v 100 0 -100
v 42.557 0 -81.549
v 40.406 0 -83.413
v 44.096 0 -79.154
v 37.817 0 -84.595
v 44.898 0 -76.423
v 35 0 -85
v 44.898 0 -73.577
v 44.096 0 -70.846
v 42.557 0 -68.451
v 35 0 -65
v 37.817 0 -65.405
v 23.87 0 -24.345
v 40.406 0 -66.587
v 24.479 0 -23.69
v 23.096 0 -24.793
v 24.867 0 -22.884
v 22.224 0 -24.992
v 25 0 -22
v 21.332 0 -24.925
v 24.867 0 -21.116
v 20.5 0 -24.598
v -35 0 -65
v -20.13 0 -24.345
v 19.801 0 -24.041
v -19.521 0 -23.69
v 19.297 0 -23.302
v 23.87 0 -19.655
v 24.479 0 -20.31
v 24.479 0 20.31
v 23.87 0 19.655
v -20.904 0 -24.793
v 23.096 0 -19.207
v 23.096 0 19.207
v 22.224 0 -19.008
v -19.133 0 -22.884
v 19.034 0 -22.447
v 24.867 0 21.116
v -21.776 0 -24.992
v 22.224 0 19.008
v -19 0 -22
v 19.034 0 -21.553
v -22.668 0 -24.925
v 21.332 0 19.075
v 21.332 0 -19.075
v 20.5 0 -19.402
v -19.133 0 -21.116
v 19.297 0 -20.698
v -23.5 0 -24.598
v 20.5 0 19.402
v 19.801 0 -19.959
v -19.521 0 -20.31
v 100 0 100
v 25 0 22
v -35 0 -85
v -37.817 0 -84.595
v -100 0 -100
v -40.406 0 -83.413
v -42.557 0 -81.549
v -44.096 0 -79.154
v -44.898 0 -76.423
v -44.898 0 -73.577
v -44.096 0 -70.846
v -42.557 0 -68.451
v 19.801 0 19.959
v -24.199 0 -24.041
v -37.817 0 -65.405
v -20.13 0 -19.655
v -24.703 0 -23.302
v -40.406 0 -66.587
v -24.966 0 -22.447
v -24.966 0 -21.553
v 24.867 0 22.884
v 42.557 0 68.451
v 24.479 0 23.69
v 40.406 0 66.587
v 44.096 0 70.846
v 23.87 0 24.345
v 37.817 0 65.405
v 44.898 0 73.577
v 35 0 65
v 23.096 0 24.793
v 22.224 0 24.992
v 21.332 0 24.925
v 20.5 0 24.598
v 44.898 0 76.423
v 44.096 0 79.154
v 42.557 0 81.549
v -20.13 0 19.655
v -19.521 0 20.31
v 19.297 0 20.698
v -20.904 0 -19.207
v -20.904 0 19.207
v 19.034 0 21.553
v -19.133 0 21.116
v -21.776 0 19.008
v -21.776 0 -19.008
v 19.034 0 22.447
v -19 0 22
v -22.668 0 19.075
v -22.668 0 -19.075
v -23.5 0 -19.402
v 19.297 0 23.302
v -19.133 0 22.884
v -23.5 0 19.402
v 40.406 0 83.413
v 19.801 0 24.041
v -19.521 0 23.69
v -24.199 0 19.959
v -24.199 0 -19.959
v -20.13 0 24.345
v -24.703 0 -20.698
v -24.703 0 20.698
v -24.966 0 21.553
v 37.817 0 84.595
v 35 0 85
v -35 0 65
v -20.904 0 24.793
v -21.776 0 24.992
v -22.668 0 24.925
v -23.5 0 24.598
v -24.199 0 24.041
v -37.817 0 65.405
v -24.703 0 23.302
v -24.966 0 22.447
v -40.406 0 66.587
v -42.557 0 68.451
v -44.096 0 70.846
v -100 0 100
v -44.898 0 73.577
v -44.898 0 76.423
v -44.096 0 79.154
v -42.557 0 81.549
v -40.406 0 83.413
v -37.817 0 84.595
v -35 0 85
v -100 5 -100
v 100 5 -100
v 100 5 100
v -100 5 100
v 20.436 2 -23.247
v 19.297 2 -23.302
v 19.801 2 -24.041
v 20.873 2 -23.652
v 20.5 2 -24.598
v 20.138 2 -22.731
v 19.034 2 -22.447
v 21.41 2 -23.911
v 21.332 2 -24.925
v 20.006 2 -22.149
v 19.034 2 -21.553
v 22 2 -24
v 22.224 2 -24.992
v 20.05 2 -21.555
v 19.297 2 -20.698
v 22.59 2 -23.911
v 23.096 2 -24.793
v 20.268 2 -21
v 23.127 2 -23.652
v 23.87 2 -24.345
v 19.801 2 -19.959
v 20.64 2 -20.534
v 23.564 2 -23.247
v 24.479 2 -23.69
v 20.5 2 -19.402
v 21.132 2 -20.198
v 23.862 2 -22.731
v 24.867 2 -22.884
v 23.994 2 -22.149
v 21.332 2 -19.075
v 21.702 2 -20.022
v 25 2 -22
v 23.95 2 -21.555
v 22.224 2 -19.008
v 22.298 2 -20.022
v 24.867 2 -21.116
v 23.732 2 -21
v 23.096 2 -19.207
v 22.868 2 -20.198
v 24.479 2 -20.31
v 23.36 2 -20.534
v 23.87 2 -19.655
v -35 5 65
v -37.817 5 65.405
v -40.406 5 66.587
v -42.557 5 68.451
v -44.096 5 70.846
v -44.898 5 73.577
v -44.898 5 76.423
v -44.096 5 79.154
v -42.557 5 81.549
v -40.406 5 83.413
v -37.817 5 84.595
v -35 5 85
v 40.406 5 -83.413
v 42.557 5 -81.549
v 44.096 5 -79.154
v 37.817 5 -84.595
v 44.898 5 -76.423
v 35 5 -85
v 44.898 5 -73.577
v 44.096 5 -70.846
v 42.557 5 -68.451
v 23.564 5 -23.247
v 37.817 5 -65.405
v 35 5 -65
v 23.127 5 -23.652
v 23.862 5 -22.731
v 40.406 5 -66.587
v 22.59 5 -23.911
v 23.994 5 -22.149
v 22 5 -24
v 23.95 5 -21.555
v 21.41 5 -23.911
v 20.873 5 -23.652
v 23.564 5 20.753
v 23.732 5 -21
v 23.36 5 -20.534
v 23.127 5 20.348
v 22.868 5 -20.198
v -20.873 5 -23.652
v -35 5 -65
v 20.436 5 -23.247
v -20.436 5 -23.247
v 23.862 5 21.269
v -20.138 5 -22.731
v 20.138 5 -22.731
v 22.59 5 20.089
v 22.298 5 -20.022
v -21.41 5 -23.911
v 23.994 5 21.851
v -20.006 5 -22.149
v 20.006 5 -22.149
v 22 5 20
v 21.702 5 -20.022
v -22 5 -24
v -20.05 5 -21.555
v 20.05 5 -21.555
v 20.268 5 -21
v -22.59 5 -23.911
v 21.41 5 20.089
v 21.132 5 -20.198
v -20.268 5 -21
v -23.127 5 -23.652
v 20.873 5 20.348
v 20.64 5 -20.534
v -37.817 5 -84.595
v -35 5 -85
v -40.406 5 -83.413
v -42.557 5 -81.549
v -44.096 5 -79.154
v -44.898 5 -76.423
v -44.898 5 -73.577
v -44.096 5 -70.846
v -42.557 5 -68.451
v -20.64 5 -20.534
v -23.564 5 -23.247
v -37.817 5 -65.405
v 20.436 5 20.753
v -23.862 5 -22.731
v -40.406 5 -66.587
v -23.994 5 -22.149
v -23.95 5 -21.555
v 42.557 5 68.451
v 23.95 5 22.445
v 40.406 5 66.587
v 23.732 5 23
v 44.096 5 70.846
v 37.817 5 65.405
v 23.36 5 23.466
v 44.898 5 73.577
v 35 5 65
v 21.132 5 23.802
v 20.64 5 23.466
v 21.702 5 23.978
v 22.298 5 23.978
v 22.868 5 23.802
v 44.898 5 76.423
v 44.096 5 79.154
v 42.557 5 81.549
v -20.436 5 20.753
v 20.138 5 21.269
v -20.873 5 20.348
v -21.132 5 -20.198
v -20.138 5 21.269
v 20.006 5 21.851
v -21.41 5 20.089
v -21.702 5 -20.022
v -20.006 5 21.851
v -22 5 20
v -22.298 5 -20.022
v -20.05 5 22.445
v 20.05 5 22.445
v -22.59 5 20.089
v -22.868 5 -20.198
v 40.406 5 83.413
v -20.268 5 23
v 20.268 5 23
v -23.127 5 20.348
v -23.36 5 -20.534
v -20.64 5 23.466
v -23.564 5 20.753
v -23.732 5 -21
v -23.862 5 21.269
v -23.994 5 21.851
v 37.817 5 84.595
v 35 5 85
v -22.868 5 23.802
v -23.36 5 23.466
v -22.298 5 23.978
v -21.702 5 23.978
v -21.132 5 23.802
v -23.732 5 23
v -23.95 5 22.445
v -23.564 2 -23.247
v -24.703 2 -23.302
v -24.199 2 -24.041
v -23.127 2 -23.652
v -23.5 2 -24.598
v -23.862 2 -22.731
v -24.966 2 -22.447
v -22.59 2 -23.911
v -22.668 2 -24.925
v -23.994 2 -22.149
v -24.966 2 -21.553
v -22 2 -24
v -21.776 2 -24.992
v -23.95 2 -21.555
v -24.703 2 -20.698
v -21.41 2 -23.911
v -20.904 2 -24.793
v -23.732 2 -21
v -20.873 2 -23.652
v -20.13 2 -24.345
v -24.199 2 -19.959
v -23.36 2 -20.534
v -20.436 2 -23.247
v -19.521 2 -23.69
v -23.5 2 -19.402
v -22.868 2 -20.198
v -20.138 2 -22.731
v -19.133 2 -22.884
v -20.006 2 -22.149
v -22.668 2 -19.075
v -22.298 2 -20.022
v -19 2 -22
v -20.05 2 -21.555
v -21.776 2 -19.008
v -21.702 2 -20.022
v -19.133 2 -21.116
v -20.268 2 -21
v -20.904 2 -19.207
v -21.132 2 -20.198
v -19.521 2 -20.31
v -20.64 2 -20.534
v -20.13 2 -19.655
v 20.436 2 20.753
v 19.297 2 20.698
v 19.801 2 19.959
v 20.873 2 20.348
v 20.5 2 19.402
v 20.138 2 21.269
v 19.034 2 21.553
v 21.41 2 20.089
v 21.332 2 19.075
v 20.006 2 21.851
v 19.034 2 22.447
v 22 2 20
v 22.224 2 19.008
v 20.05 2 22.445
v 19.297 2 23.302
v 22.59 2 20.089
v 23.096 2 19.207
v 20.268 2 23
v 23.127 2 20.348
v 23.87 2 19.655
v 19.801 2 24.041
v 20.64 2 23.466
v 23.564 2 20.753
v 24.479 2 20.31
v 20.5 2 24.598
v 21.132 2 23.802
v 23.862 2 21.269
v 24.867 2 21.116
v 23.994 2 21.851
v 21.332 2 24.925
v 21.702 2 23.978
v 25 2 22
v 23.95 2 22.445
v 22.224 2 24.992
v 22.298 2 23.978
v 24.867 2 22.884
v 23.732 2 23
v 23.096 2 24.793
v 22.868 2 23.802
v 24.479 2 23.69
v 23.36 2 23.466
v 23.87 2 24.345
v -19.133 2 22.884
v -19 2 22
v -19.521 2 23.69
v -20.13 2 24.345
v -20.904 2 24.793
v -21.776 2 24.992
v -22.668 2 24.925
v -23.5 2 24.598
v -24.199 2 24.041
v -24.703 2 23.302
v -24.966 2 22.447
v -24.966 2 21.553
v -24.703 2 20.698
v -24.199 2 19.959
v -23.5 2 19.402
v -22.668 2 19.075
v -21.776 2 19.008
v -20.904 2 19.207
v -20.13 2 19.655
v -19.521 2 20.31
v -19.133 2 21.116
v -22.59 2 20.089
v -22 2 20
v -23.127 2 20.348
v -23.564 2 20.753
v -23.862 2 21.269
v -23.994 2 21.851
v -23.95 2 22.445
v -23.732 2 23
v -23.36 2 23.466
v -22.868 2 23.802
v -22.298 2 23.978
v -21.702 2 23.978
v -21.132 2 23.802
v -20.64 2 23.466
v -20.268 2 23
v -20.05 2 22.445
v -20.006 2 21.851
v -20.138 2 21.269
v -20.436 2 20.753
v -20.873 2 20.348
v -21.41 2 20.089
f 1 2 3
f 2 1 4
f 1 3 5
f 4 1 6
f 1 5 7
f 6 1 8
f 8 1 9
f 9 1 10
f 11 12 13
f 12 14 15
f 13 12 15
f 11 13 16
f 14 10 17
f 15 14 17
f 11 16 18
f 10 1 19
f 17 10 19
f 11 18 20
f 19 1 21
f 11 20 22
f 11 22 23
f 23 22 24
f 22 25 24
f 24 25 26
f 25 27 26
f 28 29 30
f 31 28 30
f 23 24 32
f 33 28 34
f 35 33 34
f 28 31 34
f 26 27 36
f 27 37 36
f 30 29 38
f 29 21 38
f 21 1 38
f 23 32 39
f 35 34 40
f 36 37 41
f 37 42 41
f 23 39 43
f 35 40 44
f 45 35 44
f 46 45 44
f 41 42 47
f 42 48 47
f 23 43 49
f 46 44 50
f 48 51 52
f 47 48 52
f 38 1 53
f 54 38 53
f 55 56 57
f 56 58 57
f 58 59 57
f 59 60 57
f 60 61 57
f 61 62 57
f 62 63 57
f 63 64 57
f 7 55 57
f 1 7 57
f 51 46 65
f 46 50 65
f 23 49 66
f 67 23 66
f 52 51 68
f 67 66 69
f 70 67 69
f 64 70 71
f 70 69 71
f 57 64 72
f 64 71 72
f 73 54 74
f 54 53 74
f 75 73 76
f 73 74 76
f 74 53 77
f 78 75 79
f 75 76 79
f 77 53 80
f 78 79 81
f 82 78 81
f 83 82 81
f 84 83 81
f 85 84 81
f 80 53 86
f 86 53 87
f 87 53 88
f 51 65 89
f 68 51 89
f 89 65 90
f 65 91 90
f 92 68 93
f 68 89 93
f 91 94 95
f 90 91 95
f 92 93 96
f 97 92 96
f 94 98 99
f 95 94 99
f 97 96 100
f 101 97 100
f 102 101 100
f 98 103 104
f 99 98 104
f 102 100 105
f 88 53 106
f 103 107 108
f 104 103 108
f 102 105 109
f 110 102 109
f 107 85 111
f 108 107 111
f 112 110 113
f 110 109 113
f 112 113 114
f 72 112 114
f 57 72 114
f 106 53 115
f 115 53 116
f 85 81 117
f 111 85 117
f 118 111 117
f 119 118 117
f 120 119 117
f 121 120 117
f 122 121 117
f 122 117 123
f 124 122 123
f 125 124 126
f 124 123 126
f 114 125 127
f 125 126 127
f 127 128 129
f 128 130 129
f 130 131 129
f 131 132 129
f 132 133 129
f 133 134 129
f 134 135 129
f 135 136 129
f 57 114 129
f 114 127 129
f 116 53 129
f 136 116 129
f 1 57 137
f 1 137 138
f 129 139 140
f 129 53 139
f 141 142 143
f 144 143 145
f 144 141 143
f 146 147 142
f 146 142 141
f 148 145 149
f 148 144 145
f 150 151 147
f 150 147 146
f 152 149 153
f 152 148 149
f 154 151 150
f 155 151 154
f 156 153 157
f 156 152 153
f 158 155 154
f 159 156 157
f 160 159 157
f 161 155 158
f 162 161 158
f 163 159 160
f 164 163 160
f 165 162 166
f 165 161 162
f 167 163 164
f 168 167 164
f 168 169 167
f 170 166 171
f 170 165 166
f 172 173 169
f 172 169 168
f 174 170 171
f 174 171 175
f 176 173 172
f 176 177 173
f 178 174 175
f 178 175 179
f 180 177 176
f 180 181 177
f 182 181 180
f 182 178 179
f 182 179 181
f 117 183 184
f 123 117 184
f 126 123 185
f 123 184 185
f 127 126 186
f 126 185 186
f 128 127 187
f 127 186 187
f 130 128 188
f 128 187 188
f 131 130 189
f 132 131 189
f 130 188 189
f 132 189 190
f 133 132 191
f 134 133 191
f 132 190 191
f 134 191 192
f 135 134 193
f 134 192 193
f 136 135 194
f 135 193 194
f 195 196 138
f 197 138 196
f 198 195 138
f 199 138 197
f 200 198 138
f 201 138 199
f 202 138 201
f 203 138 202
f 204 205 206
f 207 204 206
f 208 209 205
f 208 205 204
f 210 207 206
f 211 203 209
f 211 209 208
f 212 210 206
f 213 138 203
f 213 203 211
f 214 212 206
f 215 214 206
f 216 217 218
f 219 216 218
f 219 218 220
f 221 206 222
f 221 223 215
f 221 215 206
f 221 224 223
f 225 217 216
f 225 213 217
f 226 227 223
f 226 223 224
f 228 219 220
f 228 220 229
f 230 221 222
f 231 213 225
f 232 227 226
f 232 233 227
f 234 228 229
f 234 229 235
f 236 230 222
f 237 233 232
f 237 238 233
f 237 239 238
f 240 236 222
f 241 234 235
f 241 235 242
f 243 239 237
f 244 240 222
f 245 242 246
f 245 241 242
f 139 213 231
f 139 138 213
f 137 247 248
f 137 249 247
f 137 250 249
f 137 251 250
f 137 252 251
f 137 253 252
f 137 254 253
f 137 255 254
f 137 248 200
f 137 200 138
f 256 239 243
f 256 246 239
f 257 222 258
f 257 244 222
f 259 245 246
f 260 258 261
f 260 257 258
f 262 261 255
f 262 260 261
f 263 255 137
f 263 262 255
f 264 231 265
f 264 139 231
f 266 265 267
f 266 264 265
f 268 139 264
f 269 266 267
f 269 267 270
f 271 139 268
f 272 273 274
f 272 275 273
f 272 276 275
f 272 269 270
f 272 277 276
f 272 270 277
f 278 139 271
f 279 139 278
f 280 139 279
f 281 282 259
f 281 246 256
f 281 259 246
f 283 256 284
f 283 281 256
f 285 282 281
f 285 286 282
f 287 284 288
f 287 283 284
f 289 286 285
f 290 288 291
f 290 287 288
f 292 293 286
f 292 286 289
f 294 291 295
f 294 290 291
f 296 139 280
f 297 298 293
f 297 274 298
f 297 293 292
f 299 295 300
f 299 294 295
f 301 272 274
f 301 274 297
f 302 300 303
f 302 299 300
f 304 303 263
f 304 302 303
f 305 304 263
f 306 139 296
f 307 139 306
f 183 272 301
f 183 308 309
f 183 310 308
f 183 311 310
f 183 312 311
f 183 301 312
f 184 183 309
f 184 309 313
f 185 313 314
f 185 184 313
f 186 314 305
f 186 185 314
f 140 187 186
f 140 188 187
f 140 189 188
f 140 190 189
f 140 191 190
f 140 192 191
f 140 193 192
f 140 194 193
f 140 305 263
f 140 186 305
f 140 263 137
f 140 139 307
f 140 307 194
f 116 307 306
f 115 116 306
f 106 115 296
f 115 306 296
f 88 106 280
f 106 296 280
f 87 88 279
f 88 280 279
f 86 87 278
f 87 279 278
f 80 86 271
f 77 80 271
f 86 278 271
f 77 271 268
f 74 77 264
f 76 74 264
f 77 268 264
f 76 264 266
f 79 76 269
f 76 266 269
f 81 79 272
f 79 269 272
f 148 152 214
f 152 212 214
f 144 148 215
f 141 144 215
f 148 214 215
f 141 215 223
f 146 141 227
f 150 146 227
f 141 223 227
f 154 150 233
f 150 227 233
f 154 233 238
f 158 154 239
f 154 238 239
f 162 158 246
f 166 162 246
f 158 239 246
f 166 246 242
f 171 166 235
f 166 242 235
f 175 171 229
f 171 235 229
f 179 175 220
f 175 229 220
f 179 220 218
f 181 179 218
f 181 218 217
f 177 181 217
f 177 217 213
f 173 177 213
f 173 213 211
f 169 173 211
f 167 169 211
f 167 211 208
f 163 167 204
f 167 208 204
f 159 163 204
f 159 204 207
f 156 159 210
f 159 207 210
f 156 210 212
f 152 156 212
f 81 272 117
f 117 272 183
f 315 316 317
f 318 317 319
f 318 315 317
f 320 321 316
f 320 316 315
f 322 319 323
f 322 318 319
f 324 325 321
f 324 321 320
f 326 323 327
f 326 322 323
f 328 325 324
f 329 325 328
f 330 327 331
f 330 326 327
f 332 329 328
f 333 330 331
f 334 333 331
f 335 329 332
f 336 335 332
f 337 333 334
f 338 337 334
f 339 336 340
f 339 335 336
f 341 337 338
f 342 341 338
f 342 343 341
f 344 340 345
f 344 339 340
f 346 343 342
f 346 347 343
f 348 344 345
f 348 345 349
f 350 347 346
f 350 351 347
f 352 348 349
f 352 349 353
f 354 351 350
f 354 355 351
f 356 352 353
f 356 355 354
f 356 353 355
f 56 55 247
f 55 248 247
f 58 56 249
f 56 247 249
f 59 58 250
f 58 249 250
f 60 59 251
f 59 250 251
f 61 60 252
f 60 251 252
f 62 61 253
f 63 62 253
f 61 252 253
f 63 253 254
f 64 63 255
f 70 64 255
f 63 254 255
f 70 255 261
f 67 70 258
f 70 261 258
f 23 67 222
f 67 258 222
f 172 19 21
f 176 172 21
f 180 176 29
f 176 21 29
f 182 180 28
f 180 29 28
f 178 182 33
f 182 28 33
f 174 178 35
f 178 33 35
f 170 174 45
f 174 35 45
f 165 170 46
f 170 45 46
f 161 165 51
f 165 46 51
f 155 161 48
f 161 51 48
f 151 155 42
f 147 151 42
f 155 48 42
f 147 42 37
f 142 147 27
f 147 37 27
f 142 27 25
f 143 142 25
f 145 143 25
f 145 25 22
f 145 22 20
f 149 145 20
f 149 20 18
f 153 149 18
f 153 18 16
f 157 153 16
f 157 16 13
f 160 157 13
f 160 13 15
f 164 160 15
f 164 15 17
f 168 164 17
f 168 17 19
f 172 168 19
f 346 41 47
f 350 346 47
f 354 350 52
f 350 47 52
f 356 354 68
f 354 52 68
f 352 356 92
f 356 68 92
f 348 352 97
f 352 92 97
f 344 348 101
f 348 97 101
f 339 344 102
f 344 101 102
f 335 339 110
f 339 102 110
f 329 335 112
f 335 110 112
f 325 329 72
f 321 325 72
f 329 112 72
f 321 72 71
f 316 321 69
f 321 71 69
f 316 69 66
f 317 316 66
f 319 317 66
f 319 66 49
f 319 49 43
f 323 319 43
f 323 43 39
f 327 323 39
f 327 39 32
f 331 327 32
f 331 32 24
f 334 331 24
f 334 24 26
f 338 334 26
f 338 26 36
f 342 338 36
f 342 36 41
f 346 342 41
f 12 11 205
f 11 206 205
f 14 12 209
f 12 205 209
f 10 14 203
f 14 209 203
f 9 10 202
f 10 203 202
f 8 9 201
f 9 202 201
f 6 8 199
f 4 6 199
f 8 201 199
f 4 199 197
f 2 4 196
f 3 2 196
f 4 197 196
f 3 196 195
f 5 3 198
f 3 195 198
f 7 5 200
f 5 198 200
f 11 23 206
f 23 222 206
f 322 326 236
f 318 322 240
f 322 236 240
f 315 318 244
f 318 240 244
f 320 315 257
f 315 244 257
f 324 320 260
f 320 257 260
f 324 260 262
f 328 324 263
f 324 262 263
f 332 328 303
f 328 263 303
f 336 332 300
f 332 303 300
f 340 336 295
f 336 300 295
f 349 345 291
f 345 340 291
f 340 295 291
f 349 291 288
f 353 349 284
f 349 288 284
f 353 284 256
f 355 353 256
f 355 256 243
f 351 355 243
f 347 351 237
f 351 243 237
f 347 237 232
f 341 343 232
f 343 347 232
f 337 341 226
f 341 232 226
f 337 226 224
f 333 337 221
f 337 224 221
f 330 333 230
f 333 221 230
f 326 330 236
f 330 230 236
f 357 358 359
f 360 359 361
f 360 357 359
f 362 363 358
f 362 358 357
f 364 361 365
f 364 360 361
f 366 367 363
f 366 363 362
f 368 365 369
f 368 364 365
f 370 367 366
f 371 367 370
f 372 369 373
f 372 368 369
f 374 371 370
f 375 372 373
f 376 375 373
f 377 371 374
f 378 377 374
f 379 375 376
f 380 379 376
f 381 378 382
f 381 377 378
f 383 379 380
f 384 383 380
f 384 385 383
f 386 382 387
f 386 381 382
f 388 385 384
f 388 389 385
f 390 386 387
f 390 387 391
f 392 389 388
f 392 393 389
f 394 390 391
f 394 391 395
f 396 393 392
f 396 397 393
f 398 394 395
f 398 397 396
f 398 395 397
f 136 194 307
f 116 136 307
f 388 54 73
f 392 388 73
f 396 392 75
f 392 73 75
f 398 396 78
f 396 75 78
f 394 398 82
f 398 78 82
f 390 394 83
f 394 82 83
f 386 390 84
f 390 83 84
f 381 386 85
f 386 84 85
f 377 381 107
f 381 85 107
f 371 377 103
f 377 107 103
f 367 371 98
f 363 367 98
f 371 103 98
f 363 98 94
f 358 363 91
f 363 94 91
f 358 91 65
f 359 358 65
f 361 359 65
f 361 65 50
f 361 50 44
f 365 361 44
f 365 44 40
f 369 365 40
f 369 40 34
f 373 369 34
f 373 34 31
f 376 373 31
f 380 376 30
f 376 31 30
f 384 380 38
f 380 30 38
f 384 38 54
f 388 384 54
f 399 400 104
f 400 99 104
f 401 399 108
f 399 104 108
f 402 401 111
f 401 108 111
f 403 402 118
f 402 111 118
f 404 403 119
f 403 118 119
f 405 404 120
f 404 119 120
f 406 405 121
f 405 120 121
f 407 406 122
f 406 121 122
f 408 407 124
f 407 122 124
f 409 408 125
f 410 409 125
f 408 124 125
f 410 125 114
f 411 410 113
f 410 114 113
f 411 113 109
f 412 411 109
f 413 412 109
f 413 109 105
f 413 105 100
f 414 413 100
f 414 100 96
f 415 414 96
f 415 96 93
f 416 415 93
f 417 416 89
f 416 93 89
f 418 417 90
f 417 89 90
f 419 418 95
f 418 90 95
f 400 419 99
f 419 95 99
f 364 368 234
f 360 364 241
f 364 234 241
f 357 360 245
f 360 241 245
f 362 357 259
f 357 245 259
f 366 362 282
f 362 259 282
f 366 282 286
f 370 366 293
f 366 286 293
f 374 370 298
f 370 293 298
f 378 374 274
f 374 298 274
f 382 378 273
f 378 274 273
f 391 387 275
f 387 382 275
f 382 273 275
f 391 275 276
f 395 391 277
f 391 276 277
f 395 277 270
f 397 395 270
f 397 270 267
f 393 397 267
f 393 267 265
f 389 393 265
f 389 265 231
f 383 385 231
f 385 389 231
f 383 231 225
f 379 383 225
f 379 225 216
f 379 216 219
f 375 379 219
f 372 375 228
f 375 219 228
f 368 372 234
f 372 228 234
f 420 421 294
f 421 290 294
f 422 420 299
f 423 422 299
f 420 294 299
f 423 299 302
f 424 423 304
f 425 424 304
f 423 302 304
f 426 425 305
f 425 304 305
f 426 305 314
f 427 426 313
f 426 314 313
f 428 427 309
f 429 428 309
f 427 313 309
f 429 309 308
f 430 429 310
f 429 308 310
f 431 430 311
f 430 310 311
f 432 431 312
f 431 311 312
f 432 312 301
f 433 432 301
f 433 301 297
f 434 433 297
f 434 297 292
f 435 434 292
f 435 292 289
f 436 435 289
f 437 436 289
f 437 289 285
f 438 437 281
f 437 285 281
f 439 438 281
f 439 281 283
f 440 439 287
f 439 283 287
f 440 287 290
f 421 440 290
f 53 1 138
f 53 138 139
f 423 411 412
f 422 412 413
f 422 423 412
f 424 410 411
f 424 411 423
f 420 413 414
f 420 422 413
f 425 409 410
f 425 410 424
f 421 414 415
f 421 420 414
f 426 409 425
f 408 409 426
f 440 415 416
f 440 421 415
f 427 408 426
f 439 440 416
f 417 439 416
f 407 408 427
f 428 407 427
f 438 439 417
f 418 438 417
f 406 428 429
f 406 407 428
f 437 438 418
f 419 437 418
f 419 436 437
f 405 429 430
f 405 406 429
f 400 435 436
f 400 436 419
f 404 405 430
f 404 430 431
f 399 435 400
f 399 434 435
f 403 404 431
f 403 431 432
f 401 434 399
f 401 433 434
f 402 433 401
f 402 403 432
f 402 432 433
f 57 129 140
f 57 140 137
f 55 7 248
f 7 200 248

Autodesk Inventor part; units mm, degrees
ref_plane "YZ Plane" through (0, 0, 0) normal (1, 0, 0) x (0, 1, 0)
ref_plane "XZ Plane" through (0, 0, 0) normal (0, 1, 0) x (-1, 0, 0)
ref_plane "XY Plane" through (0, 0, 0) normal (0, 0, 1) x (1, 0, 0)
sketch "Sketch1" plane through (0, 0, 0) normal (0, 1, 0) x (-1, 0, 0)
  line L0 (-100, 100) -> (100, 100)
  line L1 (100, 100) -> (100, -100)
  line L2 (100, -100) -> (-100, -100)
  line L3 (-100, -100) -> (-100, 100)
  line L4 (-100, 100) -> (100, -100) construction
  line L5 (100, 100) -> (-100, -100) construction
  point P0 (0, 0)
  dimension "d0" = 200
  dimension "d1" = 200
extrude "Extrusion1" add sketch "Sketch1" along normal blind 5
sketch "Sketch6" plane through (0, 0, 0) normal (0, -1, 0) x (1, 0, 0)
  line L0 (-22, 22) -> (22, 22)
  line L1 (22, 22) -> (22, -22)
  line L2 (22, -22) -> (-22, -22)
  line L3 (-22, -22) -> (-22, 22)
  line L4 (-22, 22) -> (22, -22) construction
  line L5 (22, 22) -> (-22, -22) construction
  point P0 (0, 0)
  dimension "d10" = 44
  dimension "d11" = 44
hole "Hole1" at (22, 0, 22) at (22, 0, -22) at (-22, 0, -22) at (-22, 0, 22) direction (0, 1, 0) diameter 4 depth 49.3
sketch "Sketch7" plane through (0, 0, 0) normal (0, -1, 0) x (1, 0, 0)
  circle A0 centre (-22, 22) radius 2 projected
  circle A1 centre (-22, 22) radius 3
  circle A2 centre (22, 22) radius 2 projected
  circle A3 centre (22, 22) radius 3
  circle A4 centre (-22, -22) radius 2 projected
  circle A5 centre (-22, -22) radius 3
  circle A6 centre (22, -22) radius 3
  point P0 (0, 0)
  dimension "d19" = 6
  dimension "d20" = 6
  dimension "d21" = 6
  dimension "d22" = 6
extrude "Extrusion3" cut sketch "Sketch7" against normal blind 2 contours A0 | A1 | A3 | A5 | A6
sketch "Sketch13" plane through (0, 5, 0) normal (0, 1, 0) x (1, 0, 0)
  line L0 (-35, 75) -> (35, 75) construction
  line L1 (-35, 65) -> (35, 65)
  line L2 (35, 85) -> (-35, 85)
  arc A0 (-35, 85) -> (-35, 65) centre (-35, 75) ccw
  arc A1 (35, 65) -> (35, 85) centre (35, 75) ccw
  line L3 (-35, 75) -> (-35, -100)
  line L4 (-100, -100) -> (100, -100) projected
  line L5 (35, 75) -> (35, -100)
  line L6 (-35, -75) -> (35, -75) construction
  line L7 (-35, -85) -> (35, -85)
  line L8 (35, -65) -> (-35, -65)
  arc A2 (-35, -65) -> (-35, -85) centre (-35, -75) ccw
  arc A3 (35, -85) -> (35, -65) centre (35, -75) ccw
  line L9 (-50, 50) -> (50, 50)
  line L10 (50, 50) -> (50, -50)
  line L11 (50, -50) -> (-50, -50)
  line L12 (-50, -50) -> (-50, 50)
  line L13 (-50, 50) -> (50, -50) construction
  line L14 (50, 50) -> (-50, -50) construction
  line L15 (16.6148, -50) -> (16.6148, -65)
  line L16 (16.6148, -85) -> (16.6148, -100)
  line L17 (31.6927, 50) -> (31.6927, 65)
  point P0 (0, 0)
  point P1 (-100, 100)
  point P2 (0, 75)
  point P3 (0, -75)
  dimension "d56" = 20
  dimension "d59" = 20
  dimension "d60" = 100
  dimension "d61" = 100
  dimension "d62" = 15
  dimension "d64" = 15
extrude "Extrusion5" cut sketch "Sketch13" against normal blind 5 contours A0 L2 A1 L1 | L8 L5 L7 L3 | L3 A2 | A3 L5
sketch "Sketch14" plane through (0, 5, 0) normal (0, 1, 0) x (1, 0, 0)
  point P0 (0, 0)
properties part number "Base myCobot_3DPrint"
